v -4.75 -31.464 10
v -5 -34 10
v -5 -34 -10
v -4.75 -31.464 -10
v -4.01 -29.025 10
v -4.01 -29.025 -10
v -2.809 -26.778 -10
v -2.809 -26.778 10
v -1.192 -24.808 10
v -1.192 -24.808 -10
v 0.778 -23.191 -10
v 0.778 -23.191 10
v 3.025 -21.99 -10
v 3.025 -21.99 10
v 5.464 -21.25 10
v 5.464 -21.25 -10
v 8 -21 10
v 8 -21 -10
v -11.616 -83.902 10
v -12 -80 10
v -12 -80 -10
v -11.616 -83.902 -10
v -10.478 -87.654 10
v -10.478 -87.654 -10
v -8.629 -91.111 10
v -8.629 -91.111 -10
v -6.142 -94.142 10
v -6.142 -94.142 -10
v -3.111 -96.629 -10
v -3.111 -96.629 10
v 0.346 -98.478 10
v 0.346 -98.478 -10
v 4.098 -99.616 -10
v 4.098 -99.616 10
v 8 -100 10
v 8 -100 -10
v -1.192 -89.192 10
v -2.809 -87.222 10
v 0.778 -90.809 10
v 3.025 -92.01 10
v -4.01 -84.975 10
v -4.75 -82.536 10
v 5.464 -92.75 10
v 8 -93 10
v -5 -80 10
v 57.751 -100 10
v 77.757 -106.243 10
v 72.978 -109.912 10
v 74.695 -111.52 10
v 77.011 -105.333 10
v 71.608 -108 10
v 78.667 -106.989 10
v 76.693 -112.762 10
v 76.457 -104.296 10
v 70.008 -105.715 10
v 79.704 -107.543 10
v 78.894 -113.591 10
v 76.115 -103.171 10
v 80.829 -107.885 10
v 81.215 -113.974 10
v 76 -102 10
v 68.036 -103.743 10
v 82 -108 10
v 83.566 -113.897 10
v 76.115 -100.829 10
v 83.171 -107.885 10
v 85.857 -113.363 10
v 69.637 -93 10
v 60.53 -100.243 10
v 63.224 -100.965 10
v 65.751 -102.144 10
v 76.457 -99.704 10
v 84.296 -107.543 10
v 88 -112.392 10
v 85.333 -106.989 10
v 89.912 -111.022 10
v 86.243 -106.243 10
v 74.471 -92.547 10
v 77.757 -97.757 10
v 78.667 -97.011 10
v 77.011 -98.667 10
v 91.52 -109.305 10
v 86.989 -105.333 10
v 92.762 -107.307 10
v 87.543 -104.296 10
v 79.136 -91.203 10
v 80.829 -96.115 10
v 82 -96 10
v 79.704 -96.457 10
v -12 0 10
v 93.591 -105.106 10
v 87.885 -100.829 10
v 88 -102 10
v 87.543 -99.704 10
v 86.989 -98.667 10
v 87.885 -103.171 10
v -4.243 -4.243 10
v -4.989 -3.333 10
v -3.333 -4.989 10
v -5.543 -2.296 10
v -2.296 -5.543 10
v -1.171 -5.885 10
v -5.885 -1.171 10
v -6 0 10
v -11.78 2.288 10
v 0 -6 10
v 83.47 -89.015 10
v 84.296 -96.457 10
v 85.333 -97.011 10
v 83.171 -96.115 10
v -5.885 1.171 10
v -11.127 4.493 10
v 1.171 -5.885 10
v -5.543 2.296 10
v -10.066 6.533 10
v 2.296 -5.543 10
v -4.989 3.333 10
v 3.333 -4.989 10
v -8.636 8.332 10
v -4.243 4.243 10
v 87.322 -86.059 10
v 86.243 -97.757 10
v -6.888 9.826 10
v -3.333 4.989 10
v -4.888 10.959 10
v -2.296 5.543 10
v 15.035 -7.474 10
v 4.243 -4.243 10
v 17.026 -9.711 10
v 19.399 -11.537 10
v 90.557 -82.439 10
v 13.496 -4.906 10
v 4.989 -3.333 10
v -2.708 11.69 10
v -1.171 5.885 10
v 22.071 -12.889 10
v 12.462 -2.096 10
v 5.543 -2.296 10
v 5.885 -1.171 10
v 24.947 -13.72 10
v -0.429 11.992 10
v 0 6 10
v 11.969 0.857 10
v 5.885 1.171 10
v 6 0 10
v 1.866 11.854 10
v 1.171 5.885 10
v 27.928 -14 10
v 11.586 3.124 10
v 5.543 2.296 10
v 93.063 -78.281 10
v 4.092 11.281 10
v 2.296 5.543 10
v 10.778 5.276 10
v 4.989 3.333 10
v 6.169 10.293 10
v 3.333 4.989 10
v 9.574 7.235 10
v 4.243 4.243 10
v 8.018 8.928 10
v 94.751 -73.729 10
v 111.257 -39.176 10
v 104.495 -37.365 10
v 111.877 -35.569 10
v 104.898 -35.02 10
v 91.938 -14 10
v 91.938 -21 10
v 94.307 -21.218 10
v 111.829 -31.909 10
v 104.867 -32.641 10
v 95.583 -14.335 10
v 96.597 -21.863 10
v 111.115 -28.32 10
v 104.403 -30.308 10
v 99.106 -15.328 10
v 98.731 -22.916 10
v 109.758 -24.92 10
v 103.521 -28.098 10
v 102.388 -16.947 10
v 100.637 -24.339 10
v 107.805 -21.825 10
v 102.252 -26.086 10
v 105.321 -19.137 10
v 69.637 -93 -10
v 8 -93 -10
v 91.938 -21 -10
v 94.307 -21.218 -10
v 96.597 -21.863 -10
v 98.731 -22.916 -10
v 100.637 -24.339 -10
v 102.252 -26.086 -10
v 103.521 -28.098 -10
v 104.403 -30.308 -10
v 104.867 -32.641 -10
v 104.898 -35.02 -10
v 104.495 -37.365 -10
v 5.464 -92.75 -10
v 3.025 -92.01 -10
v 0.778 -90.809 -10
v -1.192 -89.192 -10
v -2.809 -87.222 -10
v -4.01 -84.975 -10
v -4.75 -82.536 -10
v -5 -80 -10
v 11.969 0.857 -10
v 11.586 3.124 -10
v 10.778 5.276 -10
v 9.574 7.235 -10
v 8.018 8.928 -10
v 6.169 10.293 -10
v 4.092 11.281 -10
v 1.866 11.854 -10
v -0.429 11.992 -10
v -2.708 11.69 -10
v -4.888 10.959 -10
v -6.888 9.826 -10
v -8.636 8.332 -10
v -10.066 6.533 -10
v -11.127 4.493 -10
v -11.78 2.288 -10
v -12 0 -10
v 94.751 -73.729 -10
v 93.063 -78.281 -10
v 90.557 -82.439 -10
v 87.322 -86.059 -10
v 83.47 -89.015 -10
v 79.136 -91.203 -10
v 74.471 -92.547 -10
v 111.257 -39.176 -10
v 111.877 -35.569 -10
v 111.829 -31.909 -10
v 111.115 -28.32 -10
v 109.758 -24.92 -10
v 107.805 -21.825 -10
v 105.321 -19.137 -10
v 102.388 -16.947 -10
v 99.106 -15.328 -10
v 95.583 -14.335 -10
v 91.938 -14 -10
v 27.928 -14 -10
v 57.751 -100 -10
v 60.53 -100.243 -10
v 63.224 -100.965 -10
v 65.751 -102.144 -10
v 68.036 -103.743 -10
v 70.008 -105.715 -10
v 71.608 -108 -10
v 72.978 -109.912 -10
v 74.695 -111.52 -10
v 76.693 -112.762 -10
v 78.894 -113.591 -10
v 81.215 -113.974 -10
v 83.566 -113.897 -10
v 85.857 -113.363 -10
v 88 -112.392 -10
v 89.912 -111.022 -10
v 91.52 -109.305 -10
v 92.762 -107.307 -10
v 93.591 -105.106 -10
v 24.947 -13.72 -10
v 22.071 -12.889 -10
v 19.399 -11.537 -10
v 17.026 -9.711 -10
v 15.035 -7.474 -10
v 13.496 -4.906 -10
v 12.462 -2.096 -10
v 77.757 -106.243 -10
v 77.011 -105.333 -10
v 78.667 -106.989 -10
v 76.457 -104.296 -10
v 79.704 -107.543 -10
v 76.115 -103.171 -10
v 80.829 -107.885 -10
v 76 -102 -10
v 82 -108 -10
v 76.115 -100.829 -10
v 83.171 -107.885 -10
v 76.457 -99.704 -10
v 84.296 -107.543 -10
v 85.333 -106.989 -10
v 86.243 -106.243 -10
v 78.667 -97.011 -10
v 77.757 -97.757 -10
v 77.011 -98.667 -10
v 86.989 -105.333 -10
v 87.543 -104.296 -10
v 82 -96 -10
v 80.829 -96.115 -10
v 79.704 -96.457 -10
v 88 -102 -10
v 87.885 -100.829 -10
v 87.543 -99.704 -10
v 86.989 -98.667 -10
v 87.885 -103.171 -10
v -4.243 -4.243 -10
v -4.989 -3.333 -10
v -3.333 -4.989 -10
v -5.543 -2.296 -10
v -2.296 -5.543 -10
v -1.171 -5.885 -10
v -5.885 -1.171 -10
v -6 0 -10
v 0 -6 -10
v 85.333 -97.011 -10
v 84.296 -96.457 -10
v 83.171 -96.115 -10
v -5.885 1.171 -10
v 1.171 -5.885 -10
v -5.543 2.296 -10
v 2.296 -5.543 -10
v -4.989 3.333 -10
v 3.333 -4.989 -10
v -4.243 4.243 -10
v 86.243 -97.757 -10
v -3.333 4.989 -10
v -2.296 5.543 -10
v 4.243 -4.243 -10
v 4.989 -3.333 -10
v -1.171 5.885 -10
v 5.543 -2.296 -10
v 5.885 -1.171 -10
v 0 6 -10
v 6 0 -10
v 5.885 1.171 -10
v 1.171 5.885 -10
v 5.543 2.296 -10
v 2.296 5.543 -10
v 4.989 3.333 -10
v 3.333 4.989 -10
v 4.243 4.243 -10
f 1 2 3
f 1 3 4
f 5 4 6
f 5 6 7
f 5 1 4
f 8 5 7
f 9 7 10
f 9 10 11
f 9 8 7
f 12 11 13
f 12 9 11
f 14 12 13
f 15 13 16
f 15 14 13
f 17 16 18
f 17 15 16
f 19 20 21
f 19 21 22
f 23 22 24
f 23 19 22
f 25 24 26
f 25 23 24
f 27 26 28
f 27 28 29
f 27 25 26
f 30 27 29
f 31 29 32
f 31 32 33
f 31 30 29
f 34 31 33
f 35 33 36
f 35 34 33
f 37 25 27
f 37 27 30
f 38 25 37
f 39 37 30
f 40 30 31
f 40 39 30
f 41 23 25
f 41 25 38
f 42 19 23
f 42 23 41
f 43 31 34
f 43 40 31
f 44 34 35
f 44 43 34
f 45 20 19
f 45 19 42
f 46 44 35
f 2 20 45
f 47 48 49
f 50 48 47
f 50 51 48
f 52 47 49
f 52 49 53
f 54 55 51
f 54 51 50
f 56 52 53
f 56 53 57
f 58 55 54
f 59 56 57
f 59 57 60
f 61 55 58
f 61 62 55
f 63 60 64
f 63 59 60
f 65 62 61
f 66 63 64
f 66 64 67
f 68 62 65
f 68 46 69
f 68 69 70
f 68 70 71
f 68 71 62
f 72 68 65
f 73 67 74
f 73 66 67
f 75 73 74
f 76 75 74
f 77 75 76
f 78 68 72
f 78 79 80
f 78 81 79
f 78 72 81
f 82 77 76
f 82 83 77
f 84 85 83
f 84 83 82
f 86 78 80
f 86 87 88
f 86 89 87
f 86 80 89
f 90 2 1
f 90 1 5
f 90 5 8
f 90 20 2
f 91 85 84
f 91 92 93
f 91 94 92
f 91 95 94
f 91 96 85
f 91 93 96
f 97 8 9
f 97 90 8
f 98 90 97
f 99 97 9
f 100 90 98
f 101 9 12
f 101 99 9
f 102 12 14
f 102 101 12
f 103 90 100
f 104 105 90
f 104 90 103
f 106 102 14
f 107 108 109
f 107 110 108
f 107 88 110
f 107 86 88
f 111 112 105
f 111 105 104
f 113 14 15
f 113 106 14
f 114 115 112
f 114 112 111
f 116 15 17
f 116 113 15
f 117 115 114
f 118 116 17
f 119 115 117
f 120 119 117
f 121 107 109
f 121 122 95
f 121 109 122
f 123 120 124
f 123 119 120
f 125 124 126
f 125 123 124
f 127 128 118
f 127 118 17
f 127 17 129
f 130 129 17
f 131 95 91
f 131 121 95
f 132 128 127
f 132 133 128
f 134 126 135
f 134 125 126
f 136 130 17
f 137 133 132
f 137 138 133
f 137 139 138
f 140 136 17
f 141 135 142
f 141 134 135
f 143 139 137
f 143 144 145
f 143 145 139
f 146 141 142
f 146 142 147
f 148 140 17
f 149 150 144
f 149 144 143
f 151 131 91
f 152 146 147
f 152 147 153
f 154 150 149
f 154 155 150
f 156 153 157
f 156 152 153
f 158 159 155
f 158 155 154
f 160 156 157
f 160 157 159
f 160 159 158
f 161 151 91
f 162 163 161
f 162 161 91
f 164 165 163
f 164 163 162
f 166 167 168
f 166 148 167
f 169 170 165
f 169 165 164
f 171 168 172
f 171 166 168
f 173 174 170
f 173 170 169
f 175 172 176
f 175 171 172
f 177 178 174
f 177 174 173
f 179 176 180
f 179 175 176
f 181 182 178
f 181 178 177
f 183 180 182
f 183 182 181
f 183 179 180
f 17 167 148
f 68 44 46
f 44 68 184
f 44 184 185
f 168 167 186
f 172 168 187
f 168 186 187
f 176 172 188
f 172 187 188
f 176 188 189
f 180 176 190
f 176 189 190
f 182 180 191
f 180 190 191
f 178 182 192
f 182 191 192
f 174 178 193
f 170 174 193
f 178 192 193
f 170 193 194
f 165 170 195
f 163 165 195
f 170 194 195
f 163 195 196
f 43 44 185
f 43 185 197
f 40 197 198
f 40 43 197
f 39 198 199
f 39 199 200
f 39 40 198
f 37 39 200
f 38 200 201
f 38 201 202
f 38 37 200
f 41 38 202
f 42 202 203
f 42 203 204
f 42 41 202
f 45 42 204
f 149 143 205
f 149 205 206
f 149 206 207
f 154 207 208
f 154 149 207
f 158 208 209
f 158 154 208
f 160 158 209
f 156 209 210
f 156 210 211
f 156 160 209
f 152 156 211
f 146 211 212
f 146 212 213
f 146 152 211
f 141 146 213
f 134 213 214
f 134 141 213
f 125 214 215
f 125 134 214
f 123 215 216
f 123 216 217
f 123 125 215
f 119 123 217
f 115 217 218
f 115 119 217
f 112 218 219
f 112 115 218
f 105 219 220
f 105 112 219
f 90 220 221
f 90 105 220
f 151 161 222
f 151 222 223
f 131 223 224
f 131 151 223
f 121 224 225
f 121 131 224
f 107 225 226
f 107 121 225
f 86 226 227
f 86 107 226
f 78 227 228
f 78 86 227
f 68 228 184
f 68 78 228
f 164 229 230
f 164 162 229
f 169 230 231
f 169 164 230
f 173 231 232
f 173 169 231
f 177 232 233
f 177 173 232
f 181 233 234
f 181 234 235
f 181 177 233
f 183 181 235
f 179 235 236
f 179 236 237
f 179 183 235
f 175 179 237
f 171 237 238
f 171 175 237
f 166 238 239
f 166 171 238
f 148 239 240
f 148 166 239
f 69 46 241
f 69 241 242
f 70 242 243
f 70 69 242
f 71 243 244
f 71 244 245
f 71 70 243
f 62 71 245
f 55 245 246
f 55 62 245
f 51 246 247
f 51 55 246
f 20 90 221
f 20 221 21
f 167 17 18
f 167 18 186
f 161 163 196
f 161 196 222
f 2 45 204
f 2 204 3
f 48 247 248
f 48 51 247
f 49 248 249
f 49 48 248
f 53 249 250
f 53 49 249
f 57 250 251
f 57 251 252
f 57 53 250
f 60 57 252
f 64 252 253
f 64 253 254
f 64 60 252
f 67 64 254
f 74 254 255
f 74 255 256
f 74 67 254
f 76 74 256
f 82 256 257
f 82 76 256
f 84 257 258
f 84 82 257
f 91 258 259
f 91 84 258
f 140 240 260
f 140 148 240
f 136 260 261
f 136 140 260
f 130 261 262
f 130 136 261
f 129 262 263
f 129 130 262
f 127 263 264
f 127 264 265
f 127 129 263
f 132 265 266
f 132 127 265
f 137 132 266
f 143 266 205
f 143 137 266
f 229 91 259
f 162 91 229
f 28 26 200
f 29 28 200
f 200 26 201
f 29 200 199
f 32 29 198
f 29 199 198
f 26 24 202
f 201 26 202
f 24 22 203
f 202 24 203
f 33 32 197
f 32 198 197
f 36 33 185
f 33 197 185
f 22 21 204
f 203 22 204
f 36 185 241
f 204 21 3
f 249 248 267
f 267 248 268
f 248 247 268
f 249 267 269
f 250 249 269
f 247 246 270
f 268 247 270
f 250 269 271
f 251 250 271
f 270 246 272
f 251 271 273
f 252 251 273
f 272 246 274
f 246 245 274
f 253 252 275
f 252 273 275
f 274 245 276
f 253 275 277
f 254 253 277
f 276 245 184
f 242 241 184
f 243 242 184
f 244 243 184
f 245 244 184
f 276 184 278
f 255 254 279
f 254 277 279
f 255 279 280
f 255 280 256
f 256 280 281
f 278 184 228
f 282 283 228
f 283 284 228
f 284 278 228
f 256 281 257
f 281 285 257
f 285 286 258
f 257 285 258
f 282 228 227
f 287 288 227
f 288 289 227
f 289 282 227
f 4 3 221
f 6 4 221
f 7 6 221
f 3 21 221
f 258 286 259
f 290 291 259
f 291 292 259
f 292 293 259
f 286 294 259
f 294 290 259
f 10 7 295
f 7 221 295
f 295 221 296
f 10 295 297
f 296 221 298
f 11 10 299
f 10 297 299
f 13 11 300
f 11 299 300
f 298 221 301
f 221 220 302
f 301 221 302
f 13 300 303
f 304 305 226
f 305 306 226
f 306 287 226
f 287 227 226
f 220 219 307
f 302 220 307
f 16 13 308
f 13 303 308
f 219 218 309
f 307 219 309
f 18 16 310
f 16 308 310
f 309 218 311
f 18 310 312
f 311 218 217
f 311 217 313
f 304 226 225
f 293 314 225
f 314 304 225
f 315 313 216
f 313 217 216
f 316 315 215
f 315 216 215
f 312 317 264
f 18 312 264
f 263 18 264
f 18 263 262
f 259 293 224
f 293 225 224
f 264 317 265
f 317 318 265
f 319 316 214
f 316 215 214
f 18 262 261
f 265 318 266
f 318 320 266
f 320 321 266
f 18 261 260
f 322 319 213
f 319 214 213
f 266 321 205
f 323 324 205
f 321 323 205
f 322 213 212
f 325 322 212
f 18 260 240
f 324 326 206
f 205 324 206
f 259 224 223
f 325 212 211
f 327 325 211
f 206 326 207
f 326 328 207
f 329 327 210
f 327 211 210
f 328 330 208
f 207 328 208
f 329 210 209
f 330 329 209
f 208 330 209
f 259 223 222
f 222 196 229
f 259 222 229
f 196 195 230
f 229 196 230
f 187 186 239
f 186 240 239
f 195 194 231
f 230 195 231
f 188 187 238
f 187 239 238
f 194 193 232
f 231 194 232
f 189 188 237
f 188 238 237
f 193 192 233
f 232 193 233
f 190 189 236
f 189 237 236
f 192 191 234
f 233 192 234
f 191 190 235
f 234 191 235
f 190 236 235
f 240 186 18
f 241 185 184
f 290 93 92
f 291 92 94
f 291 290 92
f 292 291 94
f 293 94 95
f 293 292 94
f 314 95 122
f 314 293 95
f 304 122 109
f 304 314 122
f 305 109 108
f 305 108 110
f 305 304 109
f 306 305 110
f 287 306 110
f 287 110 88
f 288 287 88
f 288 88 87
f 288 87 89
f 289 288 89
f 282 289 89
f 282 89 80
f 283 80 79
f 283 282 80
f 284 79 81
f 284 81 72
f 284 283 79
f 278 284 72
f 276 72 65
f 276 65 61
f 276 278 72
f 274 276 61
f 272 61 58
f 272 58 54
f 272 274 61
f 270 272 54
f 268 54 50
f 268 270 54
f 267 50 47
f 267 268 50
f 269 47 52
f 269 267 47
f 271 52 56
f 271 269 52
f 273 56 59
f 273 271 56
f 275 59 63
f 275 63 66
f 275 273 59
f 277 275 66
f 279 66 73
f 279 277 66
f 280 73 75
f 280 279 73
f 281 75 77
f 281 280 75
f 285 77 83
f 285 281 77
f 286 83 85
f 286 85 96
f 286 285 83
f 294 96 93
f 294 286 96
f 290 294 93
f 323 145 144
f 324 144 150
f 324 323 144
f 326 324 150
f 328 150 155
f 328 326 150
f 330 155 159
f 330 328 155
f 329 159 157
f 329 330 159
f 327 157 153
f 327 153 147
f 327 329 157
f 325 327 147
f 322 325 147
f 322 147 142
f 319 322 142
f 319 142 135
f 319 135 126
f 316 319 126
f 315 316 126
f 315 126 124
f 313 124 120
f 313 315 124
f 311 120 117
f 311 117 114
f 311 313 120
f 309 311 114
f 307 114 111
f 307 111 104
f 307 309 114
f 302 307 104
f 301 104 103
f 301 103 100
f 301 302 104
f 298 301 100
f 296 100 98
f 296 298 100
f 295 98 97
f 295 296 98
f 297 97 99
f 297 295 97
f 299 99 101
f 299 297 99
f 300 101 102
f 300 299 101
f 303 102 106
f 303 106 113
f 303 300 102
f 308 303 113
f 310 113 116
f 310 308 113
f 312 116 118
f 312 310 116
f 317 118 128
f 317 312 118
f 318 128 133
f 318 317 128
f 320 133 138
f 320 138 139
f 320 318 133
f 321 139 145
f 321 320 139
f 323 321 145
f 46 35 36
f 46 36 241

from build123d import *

# Parameters (mm, degrees)
SKETCH1_R           = 6
BOSS_EXTRUDE2_DEPTH = 10


with BuildPart() as part:
    # Sketch1 → Boss-Extrude2 (new, symmetric)
    with BuildSketch(Plane.XY):
        with BuildLine():
            ThreePointArc((27.928480088, -14), (17.026317786, -9.710800875), (11.969348609, 0.857142857))
            ThreePointArc((11.969348609, 0.857142857), (-0.428845364, 11.992334704), (-12, 0))
            Line((-12, 0), (-12, -80))
            ThreePointArc((-12, -80), (-6.142135624, -94.142135624), (8, -100))
            Line((8, -100), (57.751288694, -100))
            ThreePointArc((57.751288694, -100), (65.751288694, -102.143593539), (71.607695155, -108))
            ThreePointArc((71.607695155, -108), (83.566314307, -113.897338336), (93.591109915, -105.105828541))
            Line((93.591109915, -105.105828541), (111.256852168, -39.176380902))
            ThreePointArc((111.256852168, -39.176380902), (107.805402448, -21.82477142), (91.938335642, -14))
            Line((91.938335642, -14), (27.928480088, -14))
        make_face()
        with Locations((82, -102)):
            Circle(SKETCH1_R, mode=Mode.SUBTRACT)
        with BuildLine():
            Line((-5, -80), (-5, -34))
            ThreePointArc((-5, -34), (-1.192388155, -24.807611845), (8, -21))
            Line((8, -21), (91.938335642, -21))
            ThreePointArc((91.938335642, -21), (102.251929066, -26.086101423), (104.495371384, -37.364647586))
            Line((104.495371384, -37.364647586), (94.75149343, -73.729295173))
            ThreePointArc((94.75149343, -73.729295173), (85.465219101, -87.627186848), (69.637421946, -93))
            Line((69.637421946, -93), (8, -93))
            ThreePointArc((8, -93), (-1.192388155, -89.192388155), (-5, -80))
        make_face(mode=Mode.SUBTRACT)
        Circle(SKETCH1_R, mode=Mode.SUBTRACT)
    extrude(amount=BOSS_EXTRUDE2_DEPTH, both=True)


solid = part.part
